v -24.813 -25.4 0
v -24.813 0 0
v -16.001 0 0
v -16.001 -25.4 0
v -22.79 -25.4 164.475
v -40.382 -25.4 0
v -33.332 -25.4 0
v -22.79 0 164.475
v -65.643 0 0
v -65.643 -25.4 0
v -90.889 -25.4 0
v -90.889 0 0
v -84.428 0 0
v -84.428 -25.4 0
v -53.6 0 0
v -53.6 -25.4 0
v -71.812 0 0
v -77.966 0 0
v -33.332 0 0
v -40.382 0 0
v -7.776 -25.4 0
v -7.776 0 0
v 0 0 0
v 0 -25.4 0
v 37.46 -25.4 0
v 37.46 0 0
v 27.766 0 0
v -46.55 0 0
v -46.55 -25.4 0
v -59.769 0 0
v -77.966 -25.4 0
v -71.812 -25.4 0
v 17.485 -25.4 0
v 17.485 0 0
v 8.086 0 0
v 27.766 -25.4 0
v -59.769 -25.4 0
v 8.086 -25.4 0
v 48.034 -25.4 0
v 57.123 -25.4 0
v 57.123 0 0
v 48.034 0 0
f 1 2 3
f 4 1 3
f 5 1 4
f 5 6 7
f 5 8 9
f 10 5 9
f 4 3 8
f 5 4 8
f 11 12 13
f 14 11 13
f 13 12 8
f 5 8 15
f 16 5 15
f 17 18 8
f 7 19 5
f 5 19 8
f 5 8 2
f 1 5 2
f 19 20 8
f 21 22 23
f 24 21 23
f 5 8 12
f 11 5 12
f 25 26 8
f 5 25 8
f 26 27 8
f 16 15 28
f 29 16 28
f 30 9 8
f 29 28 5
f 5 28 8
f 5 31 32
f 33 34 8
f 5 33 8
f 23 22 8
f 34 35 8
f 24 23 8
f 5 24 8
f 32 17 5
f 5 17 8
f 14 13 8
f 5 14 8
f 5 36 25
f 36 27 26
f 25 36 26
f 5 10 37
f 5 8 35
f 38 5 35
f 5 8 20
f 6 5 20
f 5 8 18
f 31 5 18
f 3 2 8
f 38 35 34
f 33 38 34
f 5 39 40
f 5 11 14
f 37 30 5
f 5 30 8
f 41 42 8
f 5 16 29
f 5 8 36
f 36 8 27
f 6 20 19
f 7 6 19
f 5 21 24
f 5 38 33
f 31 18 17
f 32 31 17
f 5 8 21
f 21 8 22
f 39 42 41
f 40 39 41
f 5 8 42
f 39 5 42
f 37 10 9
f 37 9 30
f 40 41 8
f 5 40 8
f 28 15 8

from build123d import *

# Parameters (mm, degrees)
F1_DEPTH = 25.4


# Not quite as in the source:
# - a feature names something its author has since deleted; it is built from what else it names


with BuildPart() as f1:
    # F0 (on Front) → F1 (new body)
    with BuildSketch(Plane.XZ):
        Polygon((-22.78999798, 164.4750535488), (-90.8892974257, 0), (-84.4279974699, 0), align=None)
    extrude(amount=F1_DEPTH)


with BuildPart() as f1b:
    # F0 (on Front) → F1, piece 2 (new body)
    with BuildSketch(Plane.XZ):
        Polygon((-71.8118920922, 0), (-22.78999798, 164.4750535488), (-77.9664888978, 0), align=None)
    extrude(amount=F1_DEPTH)


with BuildPart() as f1c:
    # F0 (on Front) → F1, piece 3 (new body)
    with BuildSketch(Plane.XZ):
        Polygon((-59.7685277462, 0), (-22.78999798, 164.4750535488), (-65.6433403492, 0), align=None)
    extrude(amount=F1_DEPTH)


with BuildPart() as f1d:
    # F0 (on Front) → F1, piece 4 (new body)
    with BuildSketch(Plane.XZ):
        Polygon((-46.5501956642, 0), (-22.78999798, 164.4750535488), (-53.5999722779, 0), align=None)
    extrude(amount=F1_DEPTH)


with BuildPart() as f1e:
    # F0 (on Front) → F1, piece 5 (new body)
    with BuildSketch(Plane.XZ):
        Polygon((-33.3318635821, 0), (-22.78999798, 164.4750535488), (-40.3816401958, 0), align=None)
    extrude(amount=F1_DEPTH)


with BuildPart() as f1f:
    # F0 (on Front) → F1, piece 6 (new body)
    with BuildSketch(Plane.XZ):
        Polygon((-16.0011649132, 0), (-22.78999798, 164.4750535488), (-24.813387543, 0), align=None)
    extrude(amount=F1_DEPTH)


with BuildPart() as f1g:
    # F0 (on Front) → F1, piece 7 (new body)
    with BuildSketch(Plane.XZ):
        Polygon((0, 0), (-22.78999798, 164.4750535488), (-7.7764266171, 0), align=None)
    extrude(amount=F1_DEPTH)


with BuildPart() as f1h:
    # F0 (on Front) → F1, piece 8 (new body)
    with BuildSketch(Plane.XZ):
        Polygon((17.4852721393, 0), (-22.78999798, 164.4750535488), (8.0855702981, 0), align=None)
    extrude(amount=F1_DEPTH)


with BuildPart() as f1i:
    # F0 (on Front) → F1, piece 9 (new body)
    with BuildSketch(Plane.XZ):
        Polygon((37.4596379697, 0), (-22.78999798, 164.4750535488), (27.7661941946, 0), align=None)
    extrude(amount=F1_DEPTH)


with BuildPart() as f1j:
    # F0 (on Front) → F1, piece 10 (new body)
    with BuildSketch(Plane.XZ):
        Polygon((57.1233406663, 0), (-22.78999798, 164.4750535488), (48.0343028903, 0), align=None)
    extrude(amount=F1_DEPTH)


solid = Compound([f1.part, f1b.part, f1c.part, f1d.part, f1e.part, f1f.part, f1g.part, f1h.part, f1i.part, f1j.part])
